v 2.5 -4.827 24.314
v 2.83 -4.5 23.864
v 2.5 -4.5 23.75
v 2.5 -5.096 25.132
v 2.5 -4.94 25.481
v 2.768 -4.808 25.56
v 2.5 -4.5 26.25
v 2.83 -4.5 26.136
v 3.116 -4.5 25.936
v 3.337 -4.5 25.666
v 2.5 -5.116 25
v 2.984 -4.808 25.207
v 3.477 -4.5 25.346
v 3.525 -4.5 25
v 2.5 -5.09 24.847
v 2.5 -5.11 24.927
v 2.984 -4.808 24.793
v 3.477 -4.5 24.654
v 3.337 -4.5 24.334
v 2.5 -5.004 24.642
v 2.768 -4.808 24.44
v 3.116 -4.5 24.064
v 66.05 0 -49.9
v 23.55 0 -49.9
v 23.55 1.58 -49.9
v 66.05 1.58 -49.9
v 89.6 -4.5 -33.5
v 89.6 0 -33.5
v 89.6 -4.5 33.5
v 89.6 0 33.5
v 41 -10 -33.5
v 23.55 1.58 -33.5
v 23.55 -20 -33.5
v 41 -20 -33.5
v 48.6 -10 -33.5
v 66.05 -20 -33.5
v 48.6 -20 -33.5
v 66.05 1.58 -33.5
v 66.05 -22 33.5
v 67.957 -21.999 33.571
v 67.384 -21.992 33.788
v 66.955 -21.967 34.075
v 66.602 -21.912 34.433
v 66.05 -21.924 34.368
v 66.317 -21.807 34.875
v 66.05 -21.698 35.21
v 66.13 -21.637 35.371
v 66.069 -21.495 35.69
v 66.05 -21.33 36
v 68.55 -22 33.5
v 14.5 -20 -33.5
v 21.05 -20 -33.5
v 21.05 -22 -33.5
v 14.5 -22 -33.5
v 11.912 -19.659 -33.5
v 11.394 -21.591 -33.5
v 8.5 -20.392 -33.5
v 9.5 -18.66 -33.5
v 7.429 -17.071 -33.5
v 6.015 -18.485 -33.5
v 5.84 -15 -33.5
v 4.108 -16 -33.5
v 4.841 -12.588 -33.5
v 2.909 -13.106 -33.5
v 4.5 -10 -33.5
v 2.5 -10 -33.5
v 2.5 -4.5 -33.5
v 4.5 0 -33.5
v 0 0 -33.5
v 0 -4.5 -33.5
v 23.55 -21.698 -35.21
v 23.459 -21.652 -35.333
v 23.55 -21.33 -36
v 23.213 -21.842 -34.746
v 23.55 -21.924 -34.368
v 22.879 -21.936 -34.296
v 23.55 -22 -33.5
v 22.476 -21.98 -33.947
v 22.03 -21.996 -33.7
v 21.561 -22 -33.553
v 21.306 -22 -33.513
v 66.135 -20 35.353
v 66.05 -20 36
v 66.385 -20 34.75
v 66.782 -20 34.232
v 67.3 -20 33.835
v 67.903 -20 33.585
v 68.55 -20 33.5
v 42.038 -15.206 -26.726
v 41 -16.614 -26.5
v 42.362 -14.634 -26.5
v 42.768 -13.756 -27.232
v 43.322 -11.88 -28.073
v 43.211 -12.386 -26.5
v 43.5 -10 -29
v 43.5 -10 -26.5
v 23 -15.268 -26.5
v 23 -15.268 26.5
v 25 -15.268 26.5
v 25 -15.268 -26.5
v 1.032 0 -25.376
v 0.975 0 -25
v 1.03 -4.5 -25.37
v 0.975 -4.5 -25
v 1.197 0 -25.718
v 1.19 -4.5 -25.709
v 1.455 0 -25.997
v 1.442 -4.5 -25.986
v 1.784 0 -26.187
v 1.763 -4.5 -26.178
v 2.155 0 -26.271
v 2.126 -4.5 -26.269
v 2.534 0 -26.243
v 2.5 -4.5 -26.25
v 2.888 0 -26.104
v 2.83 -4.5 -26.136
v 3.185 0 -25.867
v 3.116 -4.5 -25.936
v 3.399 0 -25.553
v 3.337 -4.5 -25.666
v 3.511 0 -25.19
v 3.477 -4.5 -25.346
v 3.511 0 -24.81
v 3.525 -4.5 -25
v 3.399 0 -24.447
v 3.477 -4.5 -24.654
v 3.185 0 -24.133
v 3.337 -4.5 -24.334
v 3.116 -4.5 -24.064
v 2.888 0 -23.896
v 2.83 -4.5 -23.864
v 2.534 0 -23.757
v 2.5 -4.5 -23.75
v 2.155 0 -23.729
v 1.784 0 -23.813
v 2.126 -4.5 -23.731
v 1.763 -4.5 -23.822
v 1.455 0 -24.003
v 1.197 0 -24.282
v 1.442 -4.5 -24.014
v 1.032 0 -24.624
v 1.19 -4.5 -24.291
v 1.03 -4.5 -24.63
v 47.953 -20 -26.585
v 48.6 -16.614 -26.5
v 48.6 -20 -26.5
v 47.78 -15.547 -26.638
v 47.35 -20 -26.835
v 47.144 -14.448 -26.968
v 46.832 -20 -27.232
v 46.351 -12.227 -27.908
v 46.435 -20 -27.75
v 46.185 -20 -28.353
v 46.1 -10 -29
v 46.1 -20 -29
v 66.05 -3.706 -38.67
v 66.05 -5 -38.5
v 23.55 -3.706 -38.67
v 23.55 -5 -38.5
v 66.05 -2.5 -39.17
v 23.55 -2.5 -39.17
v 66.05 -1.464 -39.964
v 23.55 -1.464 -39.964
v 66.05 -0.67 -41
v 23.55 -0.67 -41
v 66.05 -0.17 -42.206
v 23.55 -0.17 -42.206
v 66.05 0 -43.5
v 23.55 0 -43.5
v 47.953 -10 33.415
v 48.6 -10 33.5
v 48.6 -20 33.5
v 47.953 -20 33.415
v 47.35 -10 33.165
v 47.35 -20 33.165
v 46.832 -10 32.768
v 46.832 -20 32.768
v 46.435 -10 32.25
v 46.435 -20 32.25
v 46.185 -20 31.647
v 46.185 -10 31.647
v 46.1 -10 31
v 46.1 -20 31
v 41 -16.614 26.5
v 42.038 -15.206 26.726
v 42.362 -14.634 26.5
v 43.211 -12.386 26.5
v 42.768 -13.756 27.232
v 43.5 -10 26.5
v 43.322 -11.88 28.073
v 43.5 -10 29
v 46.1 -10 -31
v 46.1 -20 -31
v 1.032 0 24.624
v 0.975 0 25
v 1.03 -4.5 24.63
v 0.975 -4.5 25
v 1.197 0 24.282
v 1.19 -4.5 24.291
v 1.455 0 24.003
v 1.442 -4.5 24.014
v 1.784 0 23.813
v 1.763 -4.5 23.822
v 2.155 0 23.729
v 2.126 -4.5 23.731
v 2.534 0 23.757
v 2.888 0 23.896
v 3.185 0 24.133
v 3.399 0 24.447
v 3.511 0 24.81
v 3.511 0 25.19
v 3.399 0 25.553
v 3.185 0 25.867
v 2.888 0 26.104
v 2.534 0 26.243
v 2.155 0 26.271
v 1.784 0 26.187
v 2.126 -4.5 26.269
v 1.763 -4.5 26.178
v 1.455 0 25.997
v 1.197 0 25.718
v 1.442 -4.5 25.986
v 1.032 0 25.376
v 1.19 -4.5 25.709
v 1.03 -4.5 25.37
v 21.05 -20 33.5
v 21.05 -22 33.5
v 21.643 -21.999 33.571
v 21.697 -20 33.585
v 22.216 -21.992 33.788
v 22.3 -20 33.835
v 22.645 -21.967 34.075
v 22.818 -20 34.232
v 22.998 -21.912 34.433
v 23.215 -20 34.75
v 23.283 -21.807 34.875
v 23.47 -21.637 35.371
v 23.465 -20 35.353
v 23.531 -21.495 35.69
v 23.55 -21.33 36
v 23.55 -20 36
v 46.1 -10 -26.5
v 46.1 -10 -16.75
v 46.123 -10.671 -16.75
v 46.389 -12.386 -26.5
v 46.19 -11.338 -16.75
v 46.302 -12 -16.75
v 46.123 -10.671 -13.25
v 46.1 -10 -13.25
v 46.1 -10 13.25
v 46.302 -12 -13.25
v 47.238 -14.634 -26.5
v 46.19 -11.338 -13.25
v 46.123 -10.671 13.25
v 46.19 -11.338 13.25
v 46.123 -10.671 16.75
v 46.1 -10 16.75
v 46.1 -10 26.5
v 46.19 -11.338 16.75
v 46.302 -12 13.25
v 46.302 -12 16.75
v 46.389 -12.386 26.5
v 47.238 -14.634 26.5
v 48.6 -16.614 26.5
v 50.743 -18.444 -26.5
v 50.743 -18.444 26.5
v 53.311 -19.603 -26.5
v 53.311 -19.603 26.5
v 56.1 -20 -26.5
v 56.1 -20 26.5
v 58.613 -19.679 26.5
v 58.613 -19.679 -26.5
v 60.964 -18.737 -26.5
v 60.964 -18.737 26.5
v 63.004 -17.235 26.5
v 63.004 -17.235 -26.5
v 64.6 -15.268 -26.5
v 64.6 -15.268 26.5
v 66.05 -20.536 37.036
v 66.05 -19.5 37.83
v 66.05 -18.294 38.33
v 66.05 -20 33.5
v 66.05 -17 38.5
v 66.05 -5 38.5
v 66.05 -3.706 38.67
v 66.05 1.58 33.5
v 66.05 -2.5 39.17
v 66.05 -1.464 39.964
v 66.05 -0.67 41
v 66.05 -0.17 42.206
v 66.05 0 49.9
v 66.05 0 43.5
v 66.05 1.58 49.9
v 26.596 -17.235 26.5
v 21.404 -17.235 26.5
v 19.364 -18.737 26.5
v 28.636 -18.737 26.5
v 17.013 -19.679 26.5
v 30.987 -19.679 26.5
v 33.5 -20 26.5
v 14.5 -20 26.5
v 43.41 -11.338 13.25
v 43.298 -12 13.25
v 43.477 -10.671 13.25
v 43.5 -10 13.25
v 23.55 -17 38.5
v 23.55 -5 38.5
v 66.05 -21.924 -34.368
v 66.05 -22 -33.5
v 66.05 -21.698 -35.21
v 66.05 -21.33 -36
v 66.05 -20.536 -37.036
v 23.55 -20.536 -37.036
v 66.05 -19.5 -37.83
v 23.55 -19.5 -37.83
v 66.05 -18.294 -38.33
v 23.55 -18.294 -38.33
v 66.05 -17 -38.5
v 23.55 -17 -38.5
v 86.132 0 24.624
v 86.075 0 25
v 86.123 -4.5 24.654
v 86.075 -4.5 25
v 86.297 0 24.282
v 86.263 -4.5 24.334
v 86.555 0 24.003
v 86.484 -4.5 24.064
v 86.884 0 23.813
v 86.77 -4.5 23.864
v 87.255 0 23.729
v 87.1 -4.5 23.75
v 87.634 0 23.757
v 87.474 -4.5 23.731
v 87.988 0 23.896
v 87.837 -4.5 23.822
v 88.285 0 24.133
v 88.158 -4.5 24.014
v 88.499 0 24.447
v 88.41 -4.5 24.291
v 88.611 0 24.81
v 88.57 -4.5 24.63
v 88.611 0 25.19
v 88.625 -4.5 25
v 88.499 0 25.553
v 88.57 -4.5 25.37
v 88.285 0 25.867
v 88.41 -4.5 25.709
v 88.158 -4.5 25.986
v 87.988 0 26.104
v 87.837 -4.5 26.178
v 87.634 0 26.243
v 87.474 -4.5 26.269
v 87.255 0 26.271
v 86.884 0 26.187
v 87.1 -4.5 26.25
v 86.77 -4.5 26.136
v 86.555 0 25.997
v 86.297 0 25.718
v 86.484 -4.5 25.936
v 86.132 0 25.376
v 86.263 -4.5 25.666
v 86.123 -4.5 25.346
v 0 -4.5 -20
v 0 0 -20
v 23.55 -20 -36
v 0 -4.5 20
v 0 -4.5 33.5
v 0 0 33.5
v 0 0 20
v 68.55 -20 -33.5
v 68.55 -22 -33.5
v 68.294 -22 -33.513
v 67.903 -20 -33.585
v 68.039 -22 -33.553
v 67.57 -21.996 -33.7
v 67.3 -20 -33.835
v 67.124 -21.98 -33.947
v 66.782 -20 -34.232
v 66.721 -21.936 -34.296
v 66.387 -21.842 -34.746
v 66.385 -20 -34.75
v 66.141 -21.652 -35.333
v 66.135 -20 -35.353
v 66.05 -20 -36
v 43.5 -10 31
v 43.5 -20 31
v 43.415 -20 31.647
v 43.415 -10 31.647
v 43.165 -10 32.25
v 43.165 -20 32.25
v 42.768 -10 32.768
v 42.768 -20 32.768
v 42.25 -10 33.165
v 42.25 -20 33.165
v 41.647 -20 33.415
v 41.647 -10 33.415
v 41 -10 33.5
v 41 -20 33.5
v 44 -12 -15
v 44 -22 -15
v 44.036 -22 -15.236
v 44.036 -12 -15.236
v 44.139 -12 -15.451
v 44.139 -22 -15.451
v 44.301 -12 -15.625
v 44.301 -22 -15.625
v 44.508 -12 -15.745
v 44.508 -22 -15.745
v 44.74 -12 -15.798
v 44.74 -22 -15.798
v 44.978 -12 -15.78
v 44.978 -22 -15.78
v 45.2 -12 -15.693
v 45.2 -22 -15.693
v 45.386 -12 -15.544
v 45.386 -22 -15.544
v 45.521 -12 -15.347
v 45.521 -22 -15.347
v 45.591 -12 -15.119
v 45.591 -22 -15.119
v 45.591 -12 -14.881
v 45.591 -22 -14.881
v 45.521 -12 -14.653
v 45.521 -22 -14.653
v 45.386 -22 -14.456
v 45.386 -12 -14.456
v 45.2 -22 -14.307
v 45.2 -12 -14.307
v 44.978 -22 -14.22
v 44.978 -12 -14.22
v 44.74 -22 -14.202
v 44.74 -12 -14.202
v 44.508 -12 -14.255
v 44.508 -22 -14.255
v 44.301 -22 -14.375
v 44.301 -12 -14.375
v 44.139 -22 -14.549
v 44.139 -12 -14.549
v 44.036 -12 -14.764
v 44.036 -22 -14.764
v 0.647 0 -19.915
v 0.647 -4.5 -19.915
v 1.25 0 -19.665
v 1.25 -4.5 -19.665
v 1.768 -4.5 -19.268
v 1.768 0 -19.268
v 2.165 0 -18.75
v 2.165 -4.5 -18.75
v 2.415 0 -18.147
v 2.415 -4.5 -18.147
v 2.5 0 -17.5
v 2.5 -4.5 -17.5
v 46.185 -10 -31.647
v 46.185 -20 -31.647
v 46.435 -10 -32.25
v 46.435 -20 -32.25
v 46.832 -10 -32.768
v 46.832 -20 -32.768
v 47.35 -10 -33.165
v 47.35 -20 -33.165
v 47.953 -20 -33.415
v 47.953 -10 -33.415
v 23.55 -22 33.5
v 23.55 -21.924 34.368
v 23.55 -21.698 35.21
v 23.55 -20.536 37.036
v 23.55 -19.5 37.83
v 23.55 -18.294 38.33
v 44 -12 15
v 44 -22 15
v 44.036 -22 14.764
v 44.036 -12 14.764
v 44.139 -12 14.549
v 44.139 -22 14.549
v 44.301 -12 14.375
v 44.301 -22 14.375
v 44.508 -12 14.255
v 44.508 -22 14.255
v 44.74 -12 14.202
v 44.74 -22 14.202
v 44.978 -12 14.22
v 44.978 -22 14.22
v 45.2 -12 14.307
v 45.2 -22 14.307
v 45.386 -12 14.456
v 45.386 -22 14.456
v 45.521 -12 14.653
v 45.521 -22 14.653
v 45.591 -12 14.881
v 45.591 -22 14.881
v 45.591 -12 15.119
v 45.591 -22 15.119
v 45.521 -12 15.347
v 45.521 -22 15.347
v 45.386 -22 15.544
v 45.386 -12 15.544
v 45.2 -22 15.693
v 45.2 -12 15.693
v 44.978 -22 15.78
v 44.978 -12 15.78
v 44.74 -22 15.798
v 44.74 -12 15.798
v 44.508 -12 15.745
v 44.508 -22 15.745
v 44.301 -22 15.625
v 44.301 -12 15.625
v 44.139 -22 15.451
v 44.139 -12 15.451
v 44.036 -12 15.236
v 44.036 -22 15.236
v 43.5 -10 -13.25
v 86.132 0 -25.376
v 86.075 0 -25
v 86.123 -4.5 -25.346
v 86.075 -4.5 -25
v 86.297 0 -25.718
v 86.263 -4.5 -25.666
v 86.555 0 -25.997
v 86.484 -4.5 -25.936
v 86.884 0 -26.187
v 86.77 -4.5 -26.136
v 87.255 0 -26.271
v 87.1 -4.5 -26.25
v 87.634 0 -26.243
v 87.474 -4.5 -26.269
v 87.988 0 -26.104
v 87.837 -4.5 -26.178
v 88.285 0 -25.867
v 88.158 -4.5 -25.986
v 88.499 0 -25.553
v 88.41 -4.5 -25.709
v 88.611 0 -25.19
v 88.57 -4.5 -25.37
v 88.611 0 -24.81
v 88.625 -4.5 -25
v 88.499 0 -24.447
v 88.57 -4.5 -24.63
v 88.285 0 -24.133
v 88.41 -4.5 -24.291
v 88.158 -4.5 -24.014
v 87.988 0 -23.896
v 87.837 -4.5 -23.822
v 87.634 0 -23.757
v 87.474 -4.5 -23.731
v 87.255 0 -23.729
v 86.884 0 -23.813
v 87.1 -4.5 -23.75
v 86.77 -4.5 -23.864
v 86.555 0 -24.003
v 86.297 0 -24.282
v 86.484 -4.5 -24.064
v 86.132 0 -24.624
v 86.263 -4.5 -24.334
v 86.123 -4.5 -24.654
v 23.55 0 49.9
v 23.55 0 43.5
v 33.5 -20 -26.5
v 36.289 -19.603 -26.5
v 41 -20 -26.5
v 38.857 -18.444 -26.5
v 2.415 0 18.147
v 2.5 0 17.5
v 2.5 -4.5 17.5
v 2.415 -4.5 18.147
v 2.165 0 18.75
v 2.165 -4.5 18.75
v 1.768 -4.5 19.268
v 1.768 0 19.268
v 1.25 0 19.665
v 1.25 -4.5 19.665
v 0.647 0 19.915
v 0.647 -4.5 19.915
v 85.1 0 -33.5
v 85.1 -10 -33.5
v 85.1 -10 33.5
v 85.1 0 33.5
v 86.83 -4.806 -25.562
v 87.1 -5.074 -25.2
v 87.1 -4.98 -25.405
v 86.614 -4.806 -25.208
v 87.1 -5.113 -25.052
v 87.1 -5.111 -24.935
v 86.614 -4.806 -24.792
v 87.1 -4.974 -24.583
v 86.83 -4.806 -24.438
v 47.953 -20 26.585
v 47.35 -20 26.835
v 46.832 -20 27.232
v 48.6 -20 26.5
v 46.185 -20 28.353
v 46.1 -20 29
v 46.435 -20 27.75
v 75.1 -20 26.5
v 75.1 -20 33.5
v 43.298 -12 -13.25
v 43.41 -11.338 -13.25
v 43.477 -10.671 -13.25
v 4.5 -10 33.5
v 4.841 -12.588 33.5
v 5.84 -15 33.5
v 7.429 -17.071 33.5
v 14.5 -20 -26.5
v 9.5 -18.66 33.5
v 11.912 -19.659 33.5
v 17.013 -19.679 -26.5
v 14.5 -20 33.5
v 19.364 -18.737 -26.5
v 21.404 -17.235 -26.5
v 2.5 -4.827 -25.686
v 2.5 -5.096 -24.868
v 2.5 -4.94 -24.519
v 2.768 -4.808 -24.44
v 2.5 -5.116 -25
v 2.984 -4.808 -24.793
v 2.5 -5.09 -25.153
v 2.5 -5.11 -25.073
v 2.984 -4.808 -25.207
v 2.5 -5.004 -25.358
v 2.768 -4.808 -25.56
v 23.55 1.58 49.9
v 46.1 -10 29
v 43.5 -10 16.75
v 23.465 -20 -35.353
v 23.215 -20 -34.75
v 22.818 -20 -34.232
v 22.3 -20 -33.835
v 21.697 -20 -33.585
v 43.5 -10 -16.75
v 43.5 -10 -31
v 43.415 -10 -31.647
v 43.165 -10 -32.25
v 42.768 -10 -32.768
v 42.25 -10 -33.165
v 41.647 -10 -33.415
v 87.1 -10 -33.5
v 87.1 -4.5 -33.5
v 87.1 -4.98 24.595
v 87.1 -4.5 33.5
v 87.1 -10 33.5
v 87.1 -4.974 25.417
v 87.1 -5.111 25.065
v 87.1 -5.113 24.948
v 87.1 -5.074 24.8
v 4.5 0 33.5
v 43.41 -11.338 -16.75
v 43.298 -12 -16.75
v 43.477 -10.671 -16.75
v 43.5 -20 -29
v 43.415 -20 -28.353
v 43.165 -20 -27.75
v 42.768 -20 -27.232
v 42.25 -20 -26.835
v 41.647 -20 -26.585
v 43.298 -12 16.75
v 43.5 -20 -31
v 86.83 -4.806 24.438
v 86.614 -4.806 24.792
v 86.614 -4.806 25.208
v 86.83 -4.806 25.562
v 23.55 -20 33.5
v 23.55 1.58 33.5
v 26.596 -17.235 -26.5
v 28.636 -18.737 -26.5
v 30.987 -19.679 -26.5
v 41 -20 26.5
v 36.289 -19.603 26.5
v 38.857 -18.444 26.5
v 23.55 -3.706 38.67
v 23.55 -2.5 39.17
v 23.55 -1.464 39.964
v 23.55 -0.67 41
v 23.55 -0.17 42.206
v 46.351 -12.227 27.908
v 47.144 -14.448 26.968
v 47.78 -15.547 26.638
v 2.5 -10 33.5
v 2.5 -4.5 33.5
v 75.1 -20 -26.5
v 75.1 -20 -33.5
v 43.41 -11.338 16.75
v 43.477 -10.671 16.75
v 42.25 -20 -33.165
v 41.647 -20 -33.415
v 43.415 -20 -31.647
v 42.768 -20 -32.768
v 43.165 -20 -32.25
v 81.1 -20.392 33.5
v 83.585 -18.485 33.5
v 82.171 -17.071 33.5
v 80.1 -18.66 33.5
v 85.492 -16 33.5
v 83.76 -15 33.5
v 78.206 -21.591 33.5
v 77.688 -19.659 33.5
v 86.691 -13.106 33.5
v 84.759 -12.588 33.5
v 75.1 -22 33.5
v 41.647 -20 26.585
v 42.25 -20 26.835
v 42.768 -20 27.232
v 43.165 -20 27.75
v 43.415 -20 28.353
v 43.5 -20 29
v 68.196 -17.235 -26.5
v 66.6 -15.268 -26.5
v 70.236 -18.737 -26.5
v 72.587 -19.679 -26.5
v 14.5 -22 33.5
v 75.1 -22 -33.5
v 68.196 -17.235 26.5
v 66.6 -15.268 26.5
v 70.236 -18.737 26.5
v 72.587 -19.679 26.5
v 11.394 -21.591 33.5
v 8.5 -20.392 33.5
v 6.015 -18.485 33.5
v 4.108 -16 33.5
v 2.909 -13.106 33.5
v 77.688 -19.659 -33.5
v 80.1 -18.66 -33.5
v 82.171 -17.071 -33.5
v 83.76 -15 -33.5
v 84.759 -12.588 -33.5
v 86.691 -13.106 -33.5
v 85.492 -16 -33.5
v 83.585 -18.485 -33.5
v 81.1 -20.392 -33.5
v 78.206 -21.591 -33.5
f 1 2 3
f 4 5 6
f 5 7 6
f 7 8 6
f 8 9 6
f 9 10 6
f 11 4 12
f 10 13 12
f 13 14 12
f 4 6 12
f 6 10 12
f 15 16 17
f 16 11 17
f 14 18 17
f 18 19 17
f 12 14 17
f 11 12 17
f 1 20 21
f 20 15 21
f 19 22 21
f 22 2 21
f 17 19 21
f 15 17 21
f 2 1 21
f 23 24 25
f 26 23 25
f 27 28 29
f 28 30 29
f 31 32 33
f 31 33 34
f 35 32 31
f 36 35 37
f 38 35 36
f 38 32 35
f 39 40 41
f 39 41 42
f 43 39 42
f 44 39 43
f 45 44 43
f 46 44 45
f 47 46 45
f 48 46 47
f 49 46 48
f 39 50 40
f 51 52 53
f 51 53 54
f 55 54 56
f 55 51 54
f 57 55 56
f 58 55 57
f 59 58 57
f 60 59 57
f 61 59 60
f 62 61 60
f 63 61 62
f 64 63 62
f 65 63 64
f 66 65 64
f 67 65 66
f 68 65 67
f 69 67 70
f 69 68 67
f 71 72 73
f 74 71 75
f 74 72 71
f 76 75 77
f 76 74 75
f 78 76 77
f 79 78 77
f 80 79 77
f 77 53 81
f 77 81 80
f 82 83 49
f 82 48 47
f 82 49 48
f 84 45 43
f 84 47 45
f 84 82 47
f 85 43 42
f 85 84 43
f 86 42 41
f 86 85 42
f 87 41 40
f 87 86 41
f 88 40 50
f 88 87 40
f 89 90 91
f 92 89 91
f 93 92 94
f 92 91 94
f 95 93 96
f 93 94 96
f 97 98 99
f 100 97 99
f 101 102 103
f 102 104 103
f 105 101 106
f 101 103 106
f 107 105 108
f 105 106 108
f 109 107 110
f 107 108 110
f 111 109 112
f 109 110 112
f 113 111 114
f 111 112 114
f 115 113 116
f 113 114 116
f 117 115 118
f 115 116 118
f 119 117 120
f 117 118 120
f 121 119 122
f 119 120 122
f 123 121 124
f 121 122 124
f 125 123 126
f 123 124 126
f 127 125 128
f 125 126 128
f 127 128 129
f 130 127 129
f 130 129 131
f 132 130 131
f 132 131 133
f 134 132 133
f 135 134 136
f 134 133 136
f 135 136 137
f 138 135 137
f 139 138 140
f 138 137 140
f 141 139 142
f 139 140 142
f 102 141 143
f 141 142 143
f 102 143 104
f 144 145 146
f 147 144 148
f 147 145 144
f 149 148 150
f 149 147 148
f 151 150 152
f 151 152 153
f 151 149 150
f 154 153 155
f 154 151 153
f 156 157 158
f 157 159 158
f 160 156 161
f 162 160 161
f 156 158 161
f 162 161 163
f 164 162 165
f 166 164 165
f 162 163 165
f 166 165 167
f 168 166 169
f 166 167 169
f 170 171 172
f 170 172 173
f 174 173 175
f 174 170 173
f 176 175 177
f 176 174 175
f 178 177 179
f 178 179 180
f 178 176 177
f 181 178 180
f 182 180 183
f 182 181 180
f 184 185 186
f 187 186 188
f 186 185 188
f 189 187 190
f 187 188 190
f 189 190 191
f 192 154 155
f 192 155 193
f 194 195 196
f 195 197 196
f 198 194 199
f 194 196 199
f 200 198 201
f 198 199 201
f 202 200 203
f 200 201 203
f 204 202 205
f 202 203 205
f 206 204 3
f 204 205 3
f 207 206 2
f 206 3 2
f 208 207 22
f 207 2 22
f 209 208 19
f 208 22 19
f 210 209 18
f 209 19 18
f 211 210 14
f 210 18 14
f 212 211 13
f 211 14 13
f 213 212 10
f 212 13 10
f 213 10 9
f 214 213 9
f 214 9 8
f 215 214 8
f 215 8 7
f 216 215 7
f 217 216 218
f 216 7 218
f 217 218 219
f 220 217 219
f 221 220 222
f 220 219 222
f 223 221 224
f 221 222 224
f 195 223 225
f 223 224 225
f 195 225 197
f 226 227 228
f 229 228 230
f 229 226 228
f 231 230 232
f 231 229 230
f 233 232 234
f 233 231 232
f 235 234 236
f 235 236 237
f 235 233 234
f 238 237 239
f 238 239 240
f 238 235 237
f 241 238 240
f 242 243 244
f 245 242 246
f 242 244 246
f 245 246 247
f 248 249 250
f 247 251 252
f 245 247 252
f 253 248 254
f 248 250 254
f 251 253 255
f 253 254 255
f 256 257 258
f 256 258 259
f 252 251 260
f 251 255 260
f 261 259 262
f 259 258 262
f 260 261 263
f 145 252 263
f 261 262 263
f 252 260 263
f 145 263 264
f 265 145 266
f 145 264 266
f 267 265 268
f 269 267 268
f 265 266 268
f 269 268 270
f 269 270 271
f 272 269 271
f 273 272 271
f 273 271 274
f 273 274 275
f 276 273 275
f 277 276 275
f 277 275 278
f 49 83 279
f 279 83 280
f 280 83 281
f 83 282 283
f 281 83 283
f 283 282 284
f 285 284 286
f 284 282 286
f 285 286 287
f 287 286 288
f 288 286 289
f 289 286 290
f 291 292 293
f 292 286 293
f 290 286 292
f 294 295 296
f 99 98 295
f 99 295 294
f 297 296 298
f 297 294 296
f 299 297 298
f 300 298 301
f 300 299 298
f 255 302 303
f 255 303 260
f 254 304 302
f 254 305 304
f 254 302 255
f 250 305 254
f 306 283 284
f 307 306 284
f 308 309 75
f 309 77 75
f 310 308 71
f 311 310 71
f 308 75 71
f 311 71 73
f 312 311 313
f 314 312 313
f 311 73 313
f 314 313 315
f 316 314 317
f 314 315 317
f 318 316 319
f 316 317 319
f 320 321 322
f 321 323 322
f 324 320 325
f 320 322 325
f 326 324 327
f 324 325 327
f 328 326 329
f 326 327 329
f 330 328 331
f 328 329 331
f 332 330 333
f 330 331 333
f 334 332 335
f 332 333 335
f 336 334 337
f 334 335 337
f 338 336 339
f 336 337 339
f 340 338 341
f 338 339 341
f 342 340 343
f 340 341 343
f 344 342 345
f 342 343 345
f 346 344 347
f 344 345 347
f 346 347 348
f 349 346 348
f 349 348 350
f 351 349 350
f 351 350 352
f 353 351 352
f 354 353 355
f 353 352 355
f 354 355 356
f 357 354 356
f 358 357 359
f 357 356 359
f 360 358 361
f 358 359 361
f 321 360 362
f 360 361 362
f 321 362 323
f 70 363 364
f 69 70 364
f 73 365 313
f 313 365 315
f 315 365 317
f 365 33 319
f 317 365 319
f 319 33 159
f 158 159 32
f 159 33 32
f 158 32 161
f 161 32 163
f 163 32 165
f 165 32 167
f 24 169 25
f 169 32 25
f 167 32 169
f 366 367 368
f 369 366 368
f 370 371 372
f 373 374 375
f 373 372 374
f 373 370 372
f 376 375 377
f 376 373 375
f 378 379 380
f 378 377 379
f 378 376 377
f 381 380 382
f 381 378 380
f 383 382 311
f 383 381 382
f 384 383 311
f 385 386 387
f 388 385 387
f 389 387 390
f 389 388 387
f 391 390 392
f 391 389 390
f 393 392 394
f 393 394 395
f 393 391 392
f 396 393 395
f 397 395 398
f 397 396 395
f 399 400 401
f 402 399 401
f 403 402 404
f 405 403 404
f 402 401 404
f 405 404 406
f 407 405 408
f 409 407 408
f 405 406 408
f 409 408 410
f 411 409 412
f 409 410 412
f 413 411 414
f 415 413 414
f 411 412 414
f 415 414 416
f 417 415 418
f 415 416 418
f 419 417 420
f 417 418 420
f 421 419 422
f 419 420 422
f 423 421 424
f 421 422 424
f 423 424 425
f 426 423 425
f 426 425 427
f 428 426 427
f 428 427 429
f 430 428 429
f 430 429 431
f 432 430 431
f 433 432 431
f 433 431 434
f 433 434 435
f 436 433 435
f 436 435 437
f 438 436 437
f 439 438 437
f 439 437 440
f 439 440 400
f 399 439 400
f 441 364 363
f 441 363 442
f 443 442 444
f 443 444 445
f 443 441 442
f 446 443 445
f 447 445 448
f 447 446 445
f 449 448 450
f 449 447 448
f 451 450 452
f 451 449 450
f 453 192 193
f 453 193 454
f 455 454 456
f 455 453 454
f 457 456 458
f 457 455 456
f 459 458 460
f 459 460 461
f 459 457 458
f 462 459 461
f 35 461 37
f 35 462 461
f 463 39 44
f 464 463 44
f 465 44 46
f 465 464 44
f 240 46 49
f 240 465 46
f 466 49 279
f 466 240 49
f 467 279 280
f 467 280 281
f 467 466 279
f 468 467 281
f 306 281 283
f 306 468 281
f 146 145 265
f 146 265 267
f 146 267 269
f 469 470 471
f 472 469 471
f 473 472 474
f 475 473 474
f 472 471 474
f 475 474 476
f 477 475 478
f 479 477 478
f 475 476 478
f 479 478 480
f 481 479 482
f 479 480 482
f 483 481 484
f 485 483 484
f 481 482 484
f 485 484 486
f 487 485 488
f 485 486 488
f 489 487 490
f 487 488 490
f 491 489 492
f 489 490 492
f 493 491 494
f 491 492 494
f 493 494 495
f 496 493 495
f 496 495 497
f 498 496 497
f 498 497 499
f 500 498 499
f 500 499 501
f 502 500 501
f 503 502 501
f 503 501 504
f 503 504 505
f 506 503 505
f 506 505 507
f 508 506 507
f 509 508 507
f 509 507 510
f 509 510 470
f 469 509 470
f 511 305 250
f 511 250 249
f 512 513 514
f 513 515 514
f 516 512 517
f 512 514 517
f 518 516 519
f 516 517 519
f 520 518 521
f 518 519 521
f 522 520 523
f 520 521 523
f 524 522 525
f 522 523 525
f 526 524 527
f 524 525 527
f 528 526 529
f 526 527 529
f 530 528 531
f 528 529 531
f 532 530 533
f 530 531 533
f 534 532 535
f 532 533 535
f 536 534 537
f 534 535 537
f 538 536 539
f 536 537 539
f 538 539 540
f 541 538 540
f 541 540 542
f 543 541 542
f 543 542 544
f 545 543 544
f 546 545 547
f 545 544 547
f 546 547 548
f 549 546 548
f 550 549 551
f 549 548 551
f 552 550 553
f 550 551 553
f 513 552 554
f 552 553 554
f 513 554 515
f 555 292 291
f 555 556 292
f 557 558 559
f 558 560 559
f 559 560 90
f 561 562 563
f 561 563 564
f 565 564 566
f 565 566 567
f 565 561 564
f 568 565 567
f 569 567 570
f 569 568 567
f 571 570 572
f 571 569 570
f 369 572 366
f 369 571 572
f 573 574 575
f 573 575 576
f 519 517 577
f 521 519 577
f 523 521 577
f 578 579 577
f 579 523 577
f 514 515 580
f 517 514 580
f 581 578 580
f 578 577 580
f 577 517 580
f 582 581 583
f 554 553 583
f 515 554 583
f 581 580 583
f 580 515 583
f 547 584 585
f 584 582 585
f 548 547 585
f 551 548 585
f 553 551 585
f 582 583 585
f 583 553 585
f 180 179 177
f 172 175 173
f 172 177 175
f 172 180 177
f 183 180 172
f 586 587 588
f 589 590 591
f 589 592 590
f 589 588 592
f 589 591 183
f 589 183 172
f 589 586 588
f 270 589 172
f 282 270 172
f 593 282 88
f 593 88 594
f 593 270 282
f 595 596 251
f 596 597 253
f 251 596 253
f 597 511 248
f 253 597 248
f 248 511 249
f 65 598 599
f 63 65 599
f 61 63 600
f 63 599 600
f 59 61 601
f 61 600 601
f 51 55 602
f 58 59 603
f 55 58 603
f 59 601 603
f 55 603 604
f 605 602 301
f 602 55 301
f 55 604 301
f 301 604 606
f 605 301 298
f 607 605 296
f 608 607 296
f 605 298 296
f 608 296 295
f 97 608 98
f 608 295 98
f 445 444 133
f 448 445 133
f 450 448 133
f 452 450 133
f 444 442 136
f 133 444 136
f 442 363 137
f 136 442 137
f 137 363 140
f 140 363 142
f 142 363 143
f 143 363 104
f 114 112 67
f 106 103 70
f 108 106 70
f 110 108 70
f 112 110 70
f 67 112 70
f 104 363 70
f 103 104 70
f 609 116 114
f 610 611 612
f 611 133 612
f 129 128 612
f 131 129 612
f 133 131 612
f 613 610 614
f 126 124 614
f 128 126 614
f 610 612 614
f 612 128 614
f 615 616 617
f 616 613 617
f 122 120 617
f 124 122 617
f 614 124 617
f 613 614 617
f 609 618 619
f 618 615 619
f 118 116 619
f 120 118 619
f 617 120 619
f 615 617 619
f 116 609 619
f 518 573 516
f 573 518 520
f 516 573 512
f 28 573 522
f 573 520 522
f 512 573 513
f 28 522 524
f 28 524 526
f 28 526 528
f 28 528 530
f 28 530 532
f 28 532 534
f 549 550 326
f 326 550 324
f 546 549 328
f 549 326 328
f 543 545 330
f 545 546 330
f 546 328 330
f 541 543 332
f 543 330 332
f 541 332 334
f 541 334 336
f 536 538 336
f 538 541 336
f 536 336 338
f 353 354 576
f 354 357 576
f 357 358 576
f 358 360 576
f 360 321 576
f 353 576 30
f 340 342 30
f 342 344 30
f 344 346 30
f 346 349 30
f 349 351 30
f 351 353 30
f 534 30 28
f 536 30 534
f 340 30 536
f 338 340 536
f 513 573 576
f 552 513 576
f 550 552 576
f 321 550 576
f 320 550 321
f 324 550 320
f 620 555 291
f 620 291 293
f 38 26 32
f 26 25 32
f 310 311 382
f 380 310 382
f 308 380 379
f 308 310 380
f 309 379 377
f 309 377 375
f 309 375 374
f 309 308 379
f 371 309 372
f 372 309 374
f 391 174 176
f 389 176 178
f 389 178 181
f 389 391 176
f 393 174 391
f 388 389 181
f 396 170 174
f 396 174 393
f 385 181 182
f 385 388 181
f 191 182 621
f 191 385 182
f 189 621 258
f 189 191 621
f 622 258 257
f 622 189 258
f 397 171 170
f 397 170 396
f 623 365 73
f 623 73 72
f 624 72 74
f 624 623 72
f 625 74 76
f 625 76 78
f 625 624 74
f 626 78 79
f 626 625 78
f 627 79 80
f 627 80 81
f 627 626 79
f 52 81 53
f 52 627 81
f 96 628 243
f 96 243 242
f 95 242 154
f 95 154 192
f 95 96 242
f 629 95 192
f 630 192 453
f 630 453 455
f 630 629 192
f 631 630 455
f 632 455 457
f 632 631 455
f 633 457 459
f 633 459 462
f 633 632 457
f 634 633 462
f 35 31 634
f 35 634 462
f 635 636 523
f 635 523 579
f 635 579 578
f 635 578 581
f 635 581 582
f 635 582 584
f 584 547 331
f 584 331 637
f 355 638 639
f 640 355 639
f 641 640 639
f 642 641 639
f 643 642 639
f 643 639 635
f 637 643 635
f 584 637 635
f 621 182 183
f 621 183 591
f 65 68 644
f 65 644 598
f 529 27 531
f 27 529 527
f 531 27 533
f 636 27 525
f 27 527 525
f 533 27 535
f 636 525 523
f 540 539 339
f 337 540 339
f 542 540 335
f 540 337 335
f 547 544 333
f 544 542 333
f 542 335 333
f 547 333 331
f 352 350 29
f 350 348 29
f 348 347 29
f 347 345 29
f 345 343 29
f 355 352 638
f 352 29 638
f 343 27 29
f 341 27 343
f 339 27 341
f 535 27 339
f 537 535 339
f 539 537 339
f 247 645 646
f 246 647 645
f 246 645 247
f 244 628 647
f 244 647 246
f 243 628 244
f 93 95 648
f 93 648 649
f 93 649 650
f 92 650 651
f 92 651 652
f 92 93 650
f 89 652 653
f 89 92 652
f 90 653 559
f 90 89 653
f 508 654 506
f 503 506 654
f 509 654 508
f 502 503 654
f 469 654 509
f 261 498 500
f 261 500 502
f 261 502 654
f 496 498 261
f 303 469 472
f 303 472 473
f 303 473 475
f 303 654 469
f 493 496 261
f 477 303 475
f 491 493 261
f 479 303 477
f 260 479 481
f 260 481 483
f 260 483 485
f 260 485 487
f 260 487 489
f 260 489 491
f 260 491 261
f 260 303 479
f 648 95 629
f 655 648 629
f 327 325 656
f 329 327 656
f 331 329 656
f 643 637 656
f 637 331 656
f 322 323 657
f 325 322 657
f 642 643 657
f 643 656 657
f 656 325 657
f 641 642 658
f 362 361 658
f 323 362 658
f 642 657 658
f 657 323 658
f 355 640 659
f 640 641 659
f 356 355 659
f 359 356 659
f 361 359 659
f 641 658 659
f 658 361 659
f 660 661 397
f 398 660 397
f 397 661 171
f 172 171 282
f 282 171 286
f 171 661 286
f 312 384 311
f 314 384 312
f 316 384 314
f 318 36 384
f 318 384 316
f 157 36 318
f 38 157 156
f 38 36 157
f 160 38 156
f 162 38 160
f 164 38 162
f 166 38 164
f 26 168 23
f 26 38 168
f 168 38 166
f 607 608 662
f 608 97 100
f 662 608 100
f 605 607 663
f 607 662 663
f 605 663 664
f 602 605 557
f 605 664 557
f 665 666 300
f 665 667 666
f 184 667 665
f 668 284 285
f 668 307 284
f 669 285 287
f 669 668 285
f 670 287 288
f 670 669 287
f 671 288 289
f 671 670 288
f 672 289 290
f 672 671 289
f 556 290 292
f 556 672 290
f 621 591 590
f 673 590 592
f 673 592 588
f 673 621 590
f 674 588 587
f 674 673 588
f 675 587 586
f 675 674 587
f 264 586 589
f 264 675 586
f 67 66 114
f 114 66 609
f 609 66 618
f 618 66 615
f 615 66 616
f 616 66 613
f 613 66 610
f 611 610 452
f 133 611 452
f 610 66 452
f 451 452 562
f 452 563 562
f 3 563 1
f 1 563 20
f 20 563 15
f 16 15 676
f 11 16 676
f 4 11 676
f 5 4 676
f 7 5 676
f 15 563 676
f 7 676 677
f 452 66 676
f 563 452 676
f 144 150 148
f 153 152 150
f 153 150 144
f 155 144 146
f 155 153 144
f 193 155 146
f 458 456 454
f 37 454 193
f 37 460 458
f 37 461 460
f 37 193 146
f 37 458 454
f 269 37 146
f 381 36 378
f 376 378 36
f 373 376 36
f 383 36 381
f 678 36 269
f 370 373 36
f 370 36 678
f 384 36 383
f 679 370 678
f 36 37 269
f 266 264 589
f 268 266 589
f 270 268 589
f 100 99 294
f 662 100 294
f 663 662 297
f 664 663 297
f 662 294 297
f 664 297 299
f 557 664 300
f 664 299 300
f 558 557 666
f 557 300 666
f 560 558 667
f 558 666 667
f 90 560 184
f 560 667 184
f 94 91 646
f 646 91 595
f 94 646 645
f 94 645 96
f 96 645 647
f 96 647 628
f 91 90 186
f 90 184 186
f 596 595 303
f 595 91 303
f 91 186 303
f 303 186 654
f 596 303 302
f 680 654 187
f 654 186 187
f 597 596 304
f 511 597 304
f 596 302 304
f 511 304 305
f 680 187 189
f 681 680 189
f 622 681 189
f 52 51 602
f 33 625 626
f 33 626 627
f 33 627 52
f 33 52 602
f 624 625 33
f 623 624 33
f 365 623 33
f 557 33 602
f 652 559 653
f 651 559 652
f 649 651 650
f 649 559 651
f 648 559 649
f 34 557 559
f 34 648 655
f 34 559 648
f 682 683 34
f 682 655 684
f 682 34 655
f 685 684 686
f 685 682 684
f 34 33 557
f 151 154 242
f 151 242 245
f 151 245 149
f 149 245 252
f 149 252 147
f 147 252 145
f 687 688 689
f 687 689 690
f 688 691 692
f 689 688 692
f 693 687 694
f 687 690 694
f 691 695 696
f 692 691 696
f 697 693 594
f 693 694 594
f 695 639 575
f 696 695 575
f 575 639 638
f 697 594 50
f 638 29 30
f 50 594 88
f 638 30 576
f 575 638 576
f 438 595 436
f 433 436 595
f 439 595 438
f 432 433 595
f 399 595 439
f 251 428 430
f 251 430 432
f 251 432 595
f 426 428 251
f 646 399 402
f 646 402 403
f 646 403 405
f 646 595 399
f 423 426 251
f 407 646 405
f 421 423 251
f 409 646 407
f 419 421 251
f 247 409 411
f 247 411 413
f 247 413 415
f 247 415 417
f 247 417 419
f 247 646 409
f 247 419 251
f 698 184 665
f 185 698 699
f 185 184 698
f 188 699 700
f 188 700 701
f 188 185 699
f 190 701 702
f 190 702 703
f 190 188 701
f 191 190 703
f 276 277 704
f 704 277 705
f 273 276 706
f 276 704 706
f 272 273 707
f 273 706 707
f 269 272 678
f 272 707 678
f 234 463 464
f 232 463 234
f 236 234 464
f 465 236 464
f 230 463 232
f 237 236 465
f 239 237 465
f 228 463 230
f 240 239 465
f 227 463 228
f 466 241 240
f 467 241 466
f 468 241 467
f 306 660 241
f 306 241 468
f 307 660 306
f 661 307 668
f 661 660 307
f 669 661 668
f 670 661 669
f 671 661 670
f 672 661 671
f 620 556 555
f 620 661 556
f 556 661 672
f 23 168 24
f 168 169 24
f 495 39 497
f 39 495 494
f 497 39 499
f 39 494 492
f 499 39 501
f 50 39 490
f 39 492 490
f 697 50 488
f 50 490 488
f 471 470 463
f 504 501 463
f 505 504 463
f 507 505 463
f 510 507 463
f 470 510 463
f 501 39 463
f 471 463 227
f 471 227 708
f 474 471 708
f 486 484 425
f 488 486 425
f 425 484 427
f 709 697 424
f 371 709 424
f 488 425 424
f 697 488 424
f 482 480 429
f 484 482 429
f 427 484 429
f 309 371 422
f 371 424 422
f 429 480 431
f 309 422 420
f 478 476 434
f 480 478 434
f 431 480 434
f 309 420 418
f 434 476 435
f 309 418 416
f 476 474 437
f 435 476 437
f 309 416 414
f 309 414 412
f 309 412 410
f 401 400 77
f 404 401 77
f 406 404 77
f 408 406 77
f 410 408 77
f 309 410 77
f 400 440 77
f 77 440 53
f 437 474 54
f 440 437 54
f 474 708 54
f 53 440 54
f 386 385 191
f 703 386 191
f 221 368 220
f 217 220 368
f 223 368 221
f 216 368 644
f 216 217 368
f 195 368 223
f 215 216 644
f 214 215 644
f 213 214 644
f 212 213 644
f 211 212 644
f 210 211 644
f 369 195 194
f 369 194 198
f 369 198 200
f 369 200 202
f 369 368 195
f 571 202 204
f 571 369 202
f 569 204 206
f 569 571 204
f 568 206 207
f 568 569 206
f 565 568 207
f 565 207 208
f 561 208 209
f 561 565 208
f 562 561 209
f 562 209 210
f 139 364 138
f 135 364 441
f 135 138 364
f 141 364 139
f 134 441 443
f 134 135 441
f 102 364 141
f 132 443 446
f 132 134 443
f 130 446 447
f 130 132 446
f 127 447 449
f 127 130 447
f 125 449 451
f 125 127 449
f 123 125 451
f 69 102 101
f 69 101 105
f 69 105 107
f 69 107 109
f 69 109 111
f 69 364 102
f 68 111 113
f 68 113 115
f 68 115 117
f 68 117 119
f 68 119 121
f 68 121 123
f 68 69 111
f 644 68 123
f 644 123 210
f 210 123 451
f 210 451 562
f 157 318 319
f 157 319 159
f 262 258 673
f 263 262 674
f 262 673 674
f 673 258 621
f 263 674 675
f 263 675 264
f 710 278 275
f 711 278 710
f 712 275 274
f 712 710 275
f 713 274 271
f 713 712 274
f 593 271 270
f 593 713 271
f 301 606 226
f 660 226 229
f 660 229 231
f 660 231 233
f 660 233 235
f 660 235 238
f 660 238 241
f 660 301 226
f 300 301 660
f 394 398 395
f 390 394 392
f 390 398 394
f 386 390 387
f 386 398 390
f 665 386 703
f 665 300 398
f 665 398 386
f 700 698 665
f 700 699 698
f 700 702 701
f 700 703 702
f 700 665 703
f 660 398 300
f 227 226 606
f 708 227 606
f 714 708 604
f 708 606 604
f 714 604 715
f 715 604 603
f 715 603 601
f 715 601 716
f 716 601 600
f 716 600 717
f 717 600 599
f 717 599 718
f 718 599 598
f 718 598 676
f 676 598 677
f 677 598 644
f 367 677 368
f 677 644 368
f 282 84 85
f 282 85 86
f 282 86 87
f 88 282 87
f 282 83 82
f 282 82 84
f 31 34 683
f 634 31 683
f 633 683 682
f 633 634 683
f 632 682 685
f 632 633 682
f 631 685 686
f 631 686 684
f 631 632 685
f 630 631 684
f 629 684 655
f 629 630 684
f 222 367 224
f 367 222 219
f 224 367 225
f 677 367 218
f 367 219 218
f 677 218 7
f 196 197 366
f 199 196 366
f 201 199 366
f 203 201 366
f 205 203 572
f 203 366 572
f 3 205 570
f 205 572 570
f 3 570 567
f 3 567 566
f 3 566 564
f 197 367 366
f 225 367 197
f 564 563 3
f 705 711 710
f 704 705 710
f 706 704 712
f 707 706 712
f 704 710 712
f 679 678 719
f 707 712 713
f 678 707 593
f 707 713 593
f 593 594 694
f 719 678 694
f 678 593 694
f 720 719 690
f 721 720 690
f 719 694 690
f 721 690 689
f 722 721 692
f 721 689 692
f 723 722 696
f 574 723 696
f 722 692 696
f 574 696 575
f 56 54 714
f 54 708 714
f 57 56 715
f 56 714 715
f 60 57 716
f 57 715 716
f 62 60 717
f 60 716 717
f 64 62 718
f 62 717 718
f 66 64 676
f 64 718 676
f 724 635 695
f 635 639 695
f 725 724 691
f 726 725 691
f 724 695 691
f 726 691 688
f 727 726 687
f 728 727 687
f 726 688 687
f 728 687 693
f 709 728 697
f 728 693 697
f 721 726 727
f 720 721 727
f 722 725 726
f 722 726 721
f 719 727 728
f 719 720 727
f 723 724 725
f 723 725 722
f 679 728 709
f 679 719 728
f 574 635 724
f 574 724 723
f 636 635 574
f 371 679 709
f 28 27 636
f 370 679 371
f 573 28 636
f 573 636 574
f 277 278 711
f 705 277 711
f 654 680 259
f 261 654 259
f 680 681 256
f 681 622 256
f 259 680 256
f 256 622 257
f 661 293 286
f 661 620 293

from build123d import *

# Parameters (mm, degrees)
BOSS_EXTRUDE1_DEPTH                       = 33.5
BOSS_EXTRUDE2_DEPTH                       = 21.25
FILLET3_R                                 = 5
CUT_EXTRUDE3_REACH                        = 106.891
SKETCH14_W                                = 2.5
SKETCH14_H                                = 40
M2X0_4_TAPPED_HOLE1_D                     = 1.6
TAPPED_HOLE_FOR_M2_5X0_45_HELICOIL1_D     = 2.55
TAPPED_HOLE_FOR_M2_5X0_45_HELICOIL1_DEPTH = 4.5
TAPPED_HOLE_FOR_M2_5X0_45_HELICOIL1_TIP   = 0.766097289
SKETCH22_W                                = 29
SKETCH22_H                                = 7
CUT_EXTRUDE4_DEPTH                        = 21.58
FILLET5_R                                 = 2.5
SKETCH23_W                                = 12.652347045
SKETCH23_H                                = 3.5
SKETCH23_W_2                              = 11.018435539
CUT_EXTRUDE5_DEPTH                        = 2


with BuildPart() as part:
    # Sketch1 → Boss-Extrude1 (new, symmetric)
    with BuildSketch(Plane.XY):
        with BuildLine():
            Line((0, 0), (4.5, 0))
            Line((4.5, 0), (4.5, -10))
            ThreePointArc((4.5, -10), (11.761387212, -19.617692031), (23, -15.267826876))
            Line((23, -15.267826876), (25, -15.267826876))
            ThreePointArc((25, -15.267826876), (36.238612788, -19.617692031), (43.5, -10))
            Line((43.5, -10), (46.1, -10))
            ThreePointArc((46.1, -10), (53.361387212, -19.617692031), (64.6, -15.267826876))
            Line((64.6, -15.267826876), (66.6, -15.267826876))
            ThreePointArc((66.6, -15.267826876), (77.838612788, -19.617692031), (85.1, -10))
            Line((85.1, -10), (85.1, 0))
            Line((85.1, 0), (89.6, 0))
            Line((89.6, 0), (89.6, -4.5))
            Line((89.6, -4.5), (87.1, -4.5))
            Line((87.1, -4.5), (87.1, -10))
            ThreePointArc((87.1, -10), (83.585281374, -18.485281374), (75.1, -22))
            Line((75.1, -22), (14.5, -22))
            ThreePointArc((14.5, -22), (6.014718626, -18.485281374), (2.5, -10))
            Line((2.5, -10), (2.5, -4.5))
            Line((2.5, -4.5), (0, -4.5))
            Line((0, -4.5), (0, 0))
        make_face()
    extrude(amount=BOSS_EXTRUDE1_DEPTH, both=True)

    # Sketch9 → Boss-Extrude2 (add, symmetric)
    with BuildSketch(Plane.ZY.offset(-44.8)):
        Polygon((33.5, -22), (38.5, -22), (38.5, 0), (49.9, 0), (49.9, 1.58), (33.5, 1.58), align=None)
    boss_extrude2 = extrude(amount=BOSS_EXTRUDE2_DEPTH, both=True)

    # Mirror1: Boss-Extrude2 across plane
    add(boss_extrude2.mirror(Plane.XY))

    # Fillet3
    fillet3_edges = [part.edges().sort_by_distance(p)[0] for p in [
        (44.8, -22, -38.5),
        (44.8, 0, -38.5),
        (44.8, 0, 38.5),
        (44.8, -22, 38.5),
    ]]
    fillet(fillet3_edges, radius=FILLET3_R)

    # Sketch14 → Cut-Extrude3 (cut, up to next)
    with BuildSketch(Plane(origin=(0, 0, 0), x_dir=(1, 0, 0), z_dir=(0, 1, 0)), mode=Mode.PRIVATE) as cut_extrude3_sk1:
        with Locations((1.25, 0)):
            Rectangle(SKETCH14_W, SKETCH14_H)
    cut_extrude3_tool1 = extrude(cut_extrude3_sk1.sketch, amount=-CUT_EXTRUDE3_REACH, mode=Mode.PRIVATE) & part.part
    add(cut_extrude3_tool1.solids().sort_by_distance((1.25, 0, 0))[0], mode=Mode.SUBTRACT)

    # M2x0.4 Tapped Hole1 (through all)
    with Locations(Plane(origin=(0, -10, 0), x_dir=(1, 0, 0), z_dir=(0, 1, 0))):
        with Locations((44.8, 15), (44.8, -15)):
            Hole(M2X0_4_TAPPED_HOLE1_D / 2)

    # Tapped Hole for M2.5x0.45 Helicoil1
    with Locations(Plane(origin=(0, 0, 0), x_dir=(1, 0, 0), z_dir=(0, 1, 0))):
        with Locations((2.25, 25), (2.25, -25), (87.35, -25), (87.35, 25)):
            Hole(TAPPED_HOLE_FOR_M2_5X0_45_HELICOIL1_D / 2, depth=TAPPED_HOLE_FOR_M2_5X0_45_HELICOIL1_DEPTH)
            with Locations((0, 0, -(TAPPED_HOLE_FOR_M2_5X0_45_HELICOIL1_DEPTH + TAPPED_HOLE_FOR_M2_5X0_45_HELICOIL1_TIP / 2))):  # 118° drill point
                Cone(0, TAPPED_HOLE_FOR_M2_5X0_45_HELICOIL1_D / 2, TAPPED_HOLE_FOR_M2_5X0_45_HELICOIL1_TIP, mode=Mode.SUBTRACT)

    # Sketch22 → Cut-Extrude4 (cut)
    with BuildSketch(Plane(origin=(0, 1.58, 0), x_dir=(1, 0, 0), z_dir=(0, 1, 0))):
        with Locations((29, 30)):
            Rectangle(SKETCH22_W, SKETCH22_H)
        with Locations((60.6, 30)):
            Rectangle(SKETCH22_W, SKETCH22_H)
        with Locations((29, -30)):
            Rectangle(SKETCH22_W, SKETCH22_H)
        with Locations((60.6, -30)):
            Rectangle(SKETCH22_W, SKETCH22_H)
    extrude(amount=-CUT_EXTRUDE4_DEPTH, mode=Mode.SUBTRACT)

    # Fillet5
    # the kernel refuses this fillet: 2.5 mm, written as the material it adds along each edge
    with BuildSketch(Plane(origin=(23.55, -20, -33.5), x_dir=(0, 0, -1), z_dir=(0, -1, 0))) as fillet5_piece_1_section:
        with BuildLine():
            CenterArc((FILLET5_R, -FILLET5_R), FILLET5_R, 90, 90)
            Line((0, -FILLET5_R), (0, 0))
            Line((0, 0), (FILLET5_R, 0))
        make_face()
    fillet5_piece_1 = extrude(amount=8.25, mode=Mode.PRIVATE)
    fillet5_piece_1 = fillet5_piece_1 & Plane(origin=(22.982039754, -17, -33.5), x_dir=(0, -1, 0), z_dir=(-1, 0, 0)) * Cylinder(5, 27, mode=Mode.PRIVATE)
    add(fillet5_piece_1)
    with BuildSketch(Plane(origin=(66.05, -20, -33.5), x_dir=(0, 0, -1), z_dir=(0, -1, 0))) as fillet5_piece_2_section:
        with BuildLine():
            CenterArc((FILLET5_R, FILLET5_R), FILLET5_R, 180, 90)
            Line((0, FILLET5_R), (0, 0))
            Line((0, 0), (FILLET5_R, 0))
        make_face()
    fillet5_piece_2 = extrude(amount=8.25, mode=Mode.PRIVATE)
    fillet5_piece_2 = fillet5_piece_2 & Plane(origin=(66.617960246, -17, -33.5), x_dir=(0, -1, 0), z_dir=(-1, 0, 0)) * Cylinder(5, 27, mode=Mode.PRIVATE)
    add(fillet5_piece_2)
    with BuildSketch(Plane(origin=(66.05, -20, 33.5), x_dir=(0, 0, 1), z_dir=(0, -1, 0))) as fillet5_piece_3_section:
        with BuildLine():
            CenterArc((FILLET5_R, -FILLET5_R), FILLET5_R, 90, 90)
            Line((0, -FILLET5_R), (0, 0))
            Line((0, 0), (FILLET5_R, 0))
        make_face()
    fillet5_piece_3 = extrude(amount=8.25, mode=Mode.PRIVATE)
    fillet5_piece_3 = fillet5_piece_3 & Plane(origin=(66.617960246, -17, 33.5), x_dir=(0, -1, 0), z_dir=(-1, 0, 0)) * Cylinder(5, 27, mode=Mode.PRIVATE)
    add(fillet5_piece_3)
    with BuildSketch(Plane(origin=(23.55, -20, 33.5), x_dir=(0, 0, 1), z_dir=(0, -1, 0))) as fillet5_piece_4_section:
        with BuildLine():
            CenterArc((FILLET5_R, FILLET5_R), FILLET5_R, 180, 90)
            Line((0, FILLET5_R), (0, 0))
            Line((0, 0), (FILLET5_R, 0))
        make_face()
    fillet5_piece_4 = extrude(amount=8.25, mode=Mode.PRIVATE)
    fillet5_piece_4 = fillet5_piece_4 & Plane(origin=(22.982039754, -17, 33.5), x_dir=(0, -1, 0), z_dir=(-1, 0, 0)) * Cylinder(5, 27, mode=Mode.PRIVATE)
    add(fillet5_piece_4)
    with BuildSketch(Plane(origin=(2.5, 0, 20), x_dir=(-1, 0, 0), z_dir=(0, -1, 0)), Plane(origin=(2.5, 0, -20), x_dir=(0, 0, 1), z_dir=(0, -1, 0))) as fillet5_piece_5:
        with BuildLine():
            CenterArc((FILLET5_R, FILLET5_R), FILLET5_R, 180, 90)
            Line((0, FILLET5_R), (0, 0))
            Line((0, 0), (FILLET5_R, 0))
        make_face()
    extrude(amount=4.5)
    with BuildSketch(Plane(origin=(43.5, -10, -26.5), x_dir=(-1, 0, 0), z_dir=(0, -1, 0))) as fillet5_piece_6_section:
        with BuildLine():
            CenterArc((FILLET5_R, FILLET5_R), FILLET5_R, 180, 90)
            Line((0, FILLET5_R), (0, 0))
            Line((0, 0), (FILLET5_R, 0))
        make_face()
    fillet5_piece_6 = extrude(amount=10, mode=Mode.PRIVATE)
    fillet5_piece_6 = fillet5_piece_6 - Plane(origin=(33.5, -10, -27.115850249), x_dir=(-0.8499999999999996, -0.5267826876426376, 0), z_dir=(0, 0, 1)) * Cylinder(10, 30, mode=Mode.PRIVATE)
    add(fillet5_piece_6)
    with BuildSketch(Plane(origin=(43.5, -10, -33.5), x_dir=(0, 0, 1), z_dir=(0, -1, 0)), Plane(origin=(43.5, -10, 33.5), x_dir=(-1, 0, 0), z_dir=(0, -1, 0))) as fillet5_piece_7:
        with BuildLine():
            CenterArc((FILLET5_R, FILLET5_R), FILLET5_R, 180, 90)
            Line((0, FILLET5_R), (0, 0))
            Line((0, 0), (FILLET5_R, 0))
        make_face()
    extrude(amount=10)
    with BuildSketch(Plane(origin=(43.5, -10, 26.5), x_dir=(-1, 0, 0), z_dir=(0, -1, 0))) as fillet5_piece_8_section:
        with BuildLine():
            CenterArc((FILLET5_R, -FILLET5_R), FILLET5_R, 90, 90)
            Line((0, -FILLET5_R), (0, 0))
            Line((0, 0), (FILLET5_R, 0))
        make_face()
    fillet5_piece_8 = extrude(amount=10, mode=Mode.PRIVATE)
    fillet5_piece_8 = fillet5_piece_8 - Plane(origin=(33.5, -10, 27.115850249), x_dir=(-0.8499999999999996, -0.5267826876426376, 0), z_dir=(0, 0, 1)) * Cylinder(10, 30, mode=Mode.PRIVATE)
    add(fillet5_piece_8)
    with BuildSketch(Plane(origin=(46.1, -10, 33.5), x_dir=(1, 0, 0), z_dir=(0, -1, 0)), Plane(origin=(46.1, -10, -33.5), x_dir=(0, 0, 1), z_dir=(0, -1, 0))) as fillet5_piece_9:
        with BuildLine():
            CenterArc((FILLET5_R, -FILLET5_R), FILLET5_R, 90, 90)
            Line((0, -FILLET5_R), (0, 0))
            Line((0, 0), (FILLET5_R, 0))
        make_face()
    extrude(amount=10)
    with BuildSketch(Plane(origin=(46.1, -10, 26.5), x_dir=(1, 0, 0), z_dir=(0, -1, 0))) as fillet5_piece_10_section:
        with BuildLine():
            CenterArc((FILLET5_R, FILLET5_R), FILLET5_R, 180, 90)
            Line((0, FILLET5_R), (0, 0))
            Line((0, 0), (FILLET5_R, 0))
        make_face()
    fillet5_piece_10 = extrude(amount=10, mode=Mode.PRIVATE)
    fillet5_piece_10 = fillet5_piece_10 - Plane(origin=(56.1, -10, 27.115850543), x_dir=(-1, 0, 0), z_dir=(0, 0, 1)) * Cylinder(10, 30, mode=Mode.PRIVATE)
    add(fillet5_piece_10)
    with BuildSketch(Plane(origin=(46.1, -10, -26.5), x_dir=(1, 0, 0), z_dir=(0, -1, 0))) as fillet5_piece_11_section:
        with BuildLine():
            CenterArc((FILLET5_R, -FILLET5_R), FILLET5_R, 90, 90)
            Line((0, -FILLET5_R), (0, 0))
            Line((0, 0), (FILLET5_R, 0))
        make_face()
    fillet5_piece_11 = extrude(amount=10, mode=Mode.PRIVATE)
    fillet5_piece_11 = fillet5_piece_11 - Plane(origin=(56.1, -10, -27.115850543), x_dir=(-1, 0, 0), z_dir=(0, 0, 1)) * Cylinder(10, 30, mode=Mode.PRIVATE)
    add(fillet5_piece_11)

    # Sketch23 → Cut-Extrude5 (cut)
    with BuildSketch(Plane(origin=(0, -10, 0), x_dir=(1, 0, 0), z_dir=(0, 1, 0))):
        with Locations((44.873232105, 15)):
            Rectangle(SKETCH23_W, SKETCH23_H)
        with Locations((44.351234715, -15)):
            Rectangle(SKETCH23_W_2, SKETCH23_H)
    extrude(amount=-CUT_EXTRUDE5_DEPTH, mode=Mode.SUBTRACT)


solid = part.part
